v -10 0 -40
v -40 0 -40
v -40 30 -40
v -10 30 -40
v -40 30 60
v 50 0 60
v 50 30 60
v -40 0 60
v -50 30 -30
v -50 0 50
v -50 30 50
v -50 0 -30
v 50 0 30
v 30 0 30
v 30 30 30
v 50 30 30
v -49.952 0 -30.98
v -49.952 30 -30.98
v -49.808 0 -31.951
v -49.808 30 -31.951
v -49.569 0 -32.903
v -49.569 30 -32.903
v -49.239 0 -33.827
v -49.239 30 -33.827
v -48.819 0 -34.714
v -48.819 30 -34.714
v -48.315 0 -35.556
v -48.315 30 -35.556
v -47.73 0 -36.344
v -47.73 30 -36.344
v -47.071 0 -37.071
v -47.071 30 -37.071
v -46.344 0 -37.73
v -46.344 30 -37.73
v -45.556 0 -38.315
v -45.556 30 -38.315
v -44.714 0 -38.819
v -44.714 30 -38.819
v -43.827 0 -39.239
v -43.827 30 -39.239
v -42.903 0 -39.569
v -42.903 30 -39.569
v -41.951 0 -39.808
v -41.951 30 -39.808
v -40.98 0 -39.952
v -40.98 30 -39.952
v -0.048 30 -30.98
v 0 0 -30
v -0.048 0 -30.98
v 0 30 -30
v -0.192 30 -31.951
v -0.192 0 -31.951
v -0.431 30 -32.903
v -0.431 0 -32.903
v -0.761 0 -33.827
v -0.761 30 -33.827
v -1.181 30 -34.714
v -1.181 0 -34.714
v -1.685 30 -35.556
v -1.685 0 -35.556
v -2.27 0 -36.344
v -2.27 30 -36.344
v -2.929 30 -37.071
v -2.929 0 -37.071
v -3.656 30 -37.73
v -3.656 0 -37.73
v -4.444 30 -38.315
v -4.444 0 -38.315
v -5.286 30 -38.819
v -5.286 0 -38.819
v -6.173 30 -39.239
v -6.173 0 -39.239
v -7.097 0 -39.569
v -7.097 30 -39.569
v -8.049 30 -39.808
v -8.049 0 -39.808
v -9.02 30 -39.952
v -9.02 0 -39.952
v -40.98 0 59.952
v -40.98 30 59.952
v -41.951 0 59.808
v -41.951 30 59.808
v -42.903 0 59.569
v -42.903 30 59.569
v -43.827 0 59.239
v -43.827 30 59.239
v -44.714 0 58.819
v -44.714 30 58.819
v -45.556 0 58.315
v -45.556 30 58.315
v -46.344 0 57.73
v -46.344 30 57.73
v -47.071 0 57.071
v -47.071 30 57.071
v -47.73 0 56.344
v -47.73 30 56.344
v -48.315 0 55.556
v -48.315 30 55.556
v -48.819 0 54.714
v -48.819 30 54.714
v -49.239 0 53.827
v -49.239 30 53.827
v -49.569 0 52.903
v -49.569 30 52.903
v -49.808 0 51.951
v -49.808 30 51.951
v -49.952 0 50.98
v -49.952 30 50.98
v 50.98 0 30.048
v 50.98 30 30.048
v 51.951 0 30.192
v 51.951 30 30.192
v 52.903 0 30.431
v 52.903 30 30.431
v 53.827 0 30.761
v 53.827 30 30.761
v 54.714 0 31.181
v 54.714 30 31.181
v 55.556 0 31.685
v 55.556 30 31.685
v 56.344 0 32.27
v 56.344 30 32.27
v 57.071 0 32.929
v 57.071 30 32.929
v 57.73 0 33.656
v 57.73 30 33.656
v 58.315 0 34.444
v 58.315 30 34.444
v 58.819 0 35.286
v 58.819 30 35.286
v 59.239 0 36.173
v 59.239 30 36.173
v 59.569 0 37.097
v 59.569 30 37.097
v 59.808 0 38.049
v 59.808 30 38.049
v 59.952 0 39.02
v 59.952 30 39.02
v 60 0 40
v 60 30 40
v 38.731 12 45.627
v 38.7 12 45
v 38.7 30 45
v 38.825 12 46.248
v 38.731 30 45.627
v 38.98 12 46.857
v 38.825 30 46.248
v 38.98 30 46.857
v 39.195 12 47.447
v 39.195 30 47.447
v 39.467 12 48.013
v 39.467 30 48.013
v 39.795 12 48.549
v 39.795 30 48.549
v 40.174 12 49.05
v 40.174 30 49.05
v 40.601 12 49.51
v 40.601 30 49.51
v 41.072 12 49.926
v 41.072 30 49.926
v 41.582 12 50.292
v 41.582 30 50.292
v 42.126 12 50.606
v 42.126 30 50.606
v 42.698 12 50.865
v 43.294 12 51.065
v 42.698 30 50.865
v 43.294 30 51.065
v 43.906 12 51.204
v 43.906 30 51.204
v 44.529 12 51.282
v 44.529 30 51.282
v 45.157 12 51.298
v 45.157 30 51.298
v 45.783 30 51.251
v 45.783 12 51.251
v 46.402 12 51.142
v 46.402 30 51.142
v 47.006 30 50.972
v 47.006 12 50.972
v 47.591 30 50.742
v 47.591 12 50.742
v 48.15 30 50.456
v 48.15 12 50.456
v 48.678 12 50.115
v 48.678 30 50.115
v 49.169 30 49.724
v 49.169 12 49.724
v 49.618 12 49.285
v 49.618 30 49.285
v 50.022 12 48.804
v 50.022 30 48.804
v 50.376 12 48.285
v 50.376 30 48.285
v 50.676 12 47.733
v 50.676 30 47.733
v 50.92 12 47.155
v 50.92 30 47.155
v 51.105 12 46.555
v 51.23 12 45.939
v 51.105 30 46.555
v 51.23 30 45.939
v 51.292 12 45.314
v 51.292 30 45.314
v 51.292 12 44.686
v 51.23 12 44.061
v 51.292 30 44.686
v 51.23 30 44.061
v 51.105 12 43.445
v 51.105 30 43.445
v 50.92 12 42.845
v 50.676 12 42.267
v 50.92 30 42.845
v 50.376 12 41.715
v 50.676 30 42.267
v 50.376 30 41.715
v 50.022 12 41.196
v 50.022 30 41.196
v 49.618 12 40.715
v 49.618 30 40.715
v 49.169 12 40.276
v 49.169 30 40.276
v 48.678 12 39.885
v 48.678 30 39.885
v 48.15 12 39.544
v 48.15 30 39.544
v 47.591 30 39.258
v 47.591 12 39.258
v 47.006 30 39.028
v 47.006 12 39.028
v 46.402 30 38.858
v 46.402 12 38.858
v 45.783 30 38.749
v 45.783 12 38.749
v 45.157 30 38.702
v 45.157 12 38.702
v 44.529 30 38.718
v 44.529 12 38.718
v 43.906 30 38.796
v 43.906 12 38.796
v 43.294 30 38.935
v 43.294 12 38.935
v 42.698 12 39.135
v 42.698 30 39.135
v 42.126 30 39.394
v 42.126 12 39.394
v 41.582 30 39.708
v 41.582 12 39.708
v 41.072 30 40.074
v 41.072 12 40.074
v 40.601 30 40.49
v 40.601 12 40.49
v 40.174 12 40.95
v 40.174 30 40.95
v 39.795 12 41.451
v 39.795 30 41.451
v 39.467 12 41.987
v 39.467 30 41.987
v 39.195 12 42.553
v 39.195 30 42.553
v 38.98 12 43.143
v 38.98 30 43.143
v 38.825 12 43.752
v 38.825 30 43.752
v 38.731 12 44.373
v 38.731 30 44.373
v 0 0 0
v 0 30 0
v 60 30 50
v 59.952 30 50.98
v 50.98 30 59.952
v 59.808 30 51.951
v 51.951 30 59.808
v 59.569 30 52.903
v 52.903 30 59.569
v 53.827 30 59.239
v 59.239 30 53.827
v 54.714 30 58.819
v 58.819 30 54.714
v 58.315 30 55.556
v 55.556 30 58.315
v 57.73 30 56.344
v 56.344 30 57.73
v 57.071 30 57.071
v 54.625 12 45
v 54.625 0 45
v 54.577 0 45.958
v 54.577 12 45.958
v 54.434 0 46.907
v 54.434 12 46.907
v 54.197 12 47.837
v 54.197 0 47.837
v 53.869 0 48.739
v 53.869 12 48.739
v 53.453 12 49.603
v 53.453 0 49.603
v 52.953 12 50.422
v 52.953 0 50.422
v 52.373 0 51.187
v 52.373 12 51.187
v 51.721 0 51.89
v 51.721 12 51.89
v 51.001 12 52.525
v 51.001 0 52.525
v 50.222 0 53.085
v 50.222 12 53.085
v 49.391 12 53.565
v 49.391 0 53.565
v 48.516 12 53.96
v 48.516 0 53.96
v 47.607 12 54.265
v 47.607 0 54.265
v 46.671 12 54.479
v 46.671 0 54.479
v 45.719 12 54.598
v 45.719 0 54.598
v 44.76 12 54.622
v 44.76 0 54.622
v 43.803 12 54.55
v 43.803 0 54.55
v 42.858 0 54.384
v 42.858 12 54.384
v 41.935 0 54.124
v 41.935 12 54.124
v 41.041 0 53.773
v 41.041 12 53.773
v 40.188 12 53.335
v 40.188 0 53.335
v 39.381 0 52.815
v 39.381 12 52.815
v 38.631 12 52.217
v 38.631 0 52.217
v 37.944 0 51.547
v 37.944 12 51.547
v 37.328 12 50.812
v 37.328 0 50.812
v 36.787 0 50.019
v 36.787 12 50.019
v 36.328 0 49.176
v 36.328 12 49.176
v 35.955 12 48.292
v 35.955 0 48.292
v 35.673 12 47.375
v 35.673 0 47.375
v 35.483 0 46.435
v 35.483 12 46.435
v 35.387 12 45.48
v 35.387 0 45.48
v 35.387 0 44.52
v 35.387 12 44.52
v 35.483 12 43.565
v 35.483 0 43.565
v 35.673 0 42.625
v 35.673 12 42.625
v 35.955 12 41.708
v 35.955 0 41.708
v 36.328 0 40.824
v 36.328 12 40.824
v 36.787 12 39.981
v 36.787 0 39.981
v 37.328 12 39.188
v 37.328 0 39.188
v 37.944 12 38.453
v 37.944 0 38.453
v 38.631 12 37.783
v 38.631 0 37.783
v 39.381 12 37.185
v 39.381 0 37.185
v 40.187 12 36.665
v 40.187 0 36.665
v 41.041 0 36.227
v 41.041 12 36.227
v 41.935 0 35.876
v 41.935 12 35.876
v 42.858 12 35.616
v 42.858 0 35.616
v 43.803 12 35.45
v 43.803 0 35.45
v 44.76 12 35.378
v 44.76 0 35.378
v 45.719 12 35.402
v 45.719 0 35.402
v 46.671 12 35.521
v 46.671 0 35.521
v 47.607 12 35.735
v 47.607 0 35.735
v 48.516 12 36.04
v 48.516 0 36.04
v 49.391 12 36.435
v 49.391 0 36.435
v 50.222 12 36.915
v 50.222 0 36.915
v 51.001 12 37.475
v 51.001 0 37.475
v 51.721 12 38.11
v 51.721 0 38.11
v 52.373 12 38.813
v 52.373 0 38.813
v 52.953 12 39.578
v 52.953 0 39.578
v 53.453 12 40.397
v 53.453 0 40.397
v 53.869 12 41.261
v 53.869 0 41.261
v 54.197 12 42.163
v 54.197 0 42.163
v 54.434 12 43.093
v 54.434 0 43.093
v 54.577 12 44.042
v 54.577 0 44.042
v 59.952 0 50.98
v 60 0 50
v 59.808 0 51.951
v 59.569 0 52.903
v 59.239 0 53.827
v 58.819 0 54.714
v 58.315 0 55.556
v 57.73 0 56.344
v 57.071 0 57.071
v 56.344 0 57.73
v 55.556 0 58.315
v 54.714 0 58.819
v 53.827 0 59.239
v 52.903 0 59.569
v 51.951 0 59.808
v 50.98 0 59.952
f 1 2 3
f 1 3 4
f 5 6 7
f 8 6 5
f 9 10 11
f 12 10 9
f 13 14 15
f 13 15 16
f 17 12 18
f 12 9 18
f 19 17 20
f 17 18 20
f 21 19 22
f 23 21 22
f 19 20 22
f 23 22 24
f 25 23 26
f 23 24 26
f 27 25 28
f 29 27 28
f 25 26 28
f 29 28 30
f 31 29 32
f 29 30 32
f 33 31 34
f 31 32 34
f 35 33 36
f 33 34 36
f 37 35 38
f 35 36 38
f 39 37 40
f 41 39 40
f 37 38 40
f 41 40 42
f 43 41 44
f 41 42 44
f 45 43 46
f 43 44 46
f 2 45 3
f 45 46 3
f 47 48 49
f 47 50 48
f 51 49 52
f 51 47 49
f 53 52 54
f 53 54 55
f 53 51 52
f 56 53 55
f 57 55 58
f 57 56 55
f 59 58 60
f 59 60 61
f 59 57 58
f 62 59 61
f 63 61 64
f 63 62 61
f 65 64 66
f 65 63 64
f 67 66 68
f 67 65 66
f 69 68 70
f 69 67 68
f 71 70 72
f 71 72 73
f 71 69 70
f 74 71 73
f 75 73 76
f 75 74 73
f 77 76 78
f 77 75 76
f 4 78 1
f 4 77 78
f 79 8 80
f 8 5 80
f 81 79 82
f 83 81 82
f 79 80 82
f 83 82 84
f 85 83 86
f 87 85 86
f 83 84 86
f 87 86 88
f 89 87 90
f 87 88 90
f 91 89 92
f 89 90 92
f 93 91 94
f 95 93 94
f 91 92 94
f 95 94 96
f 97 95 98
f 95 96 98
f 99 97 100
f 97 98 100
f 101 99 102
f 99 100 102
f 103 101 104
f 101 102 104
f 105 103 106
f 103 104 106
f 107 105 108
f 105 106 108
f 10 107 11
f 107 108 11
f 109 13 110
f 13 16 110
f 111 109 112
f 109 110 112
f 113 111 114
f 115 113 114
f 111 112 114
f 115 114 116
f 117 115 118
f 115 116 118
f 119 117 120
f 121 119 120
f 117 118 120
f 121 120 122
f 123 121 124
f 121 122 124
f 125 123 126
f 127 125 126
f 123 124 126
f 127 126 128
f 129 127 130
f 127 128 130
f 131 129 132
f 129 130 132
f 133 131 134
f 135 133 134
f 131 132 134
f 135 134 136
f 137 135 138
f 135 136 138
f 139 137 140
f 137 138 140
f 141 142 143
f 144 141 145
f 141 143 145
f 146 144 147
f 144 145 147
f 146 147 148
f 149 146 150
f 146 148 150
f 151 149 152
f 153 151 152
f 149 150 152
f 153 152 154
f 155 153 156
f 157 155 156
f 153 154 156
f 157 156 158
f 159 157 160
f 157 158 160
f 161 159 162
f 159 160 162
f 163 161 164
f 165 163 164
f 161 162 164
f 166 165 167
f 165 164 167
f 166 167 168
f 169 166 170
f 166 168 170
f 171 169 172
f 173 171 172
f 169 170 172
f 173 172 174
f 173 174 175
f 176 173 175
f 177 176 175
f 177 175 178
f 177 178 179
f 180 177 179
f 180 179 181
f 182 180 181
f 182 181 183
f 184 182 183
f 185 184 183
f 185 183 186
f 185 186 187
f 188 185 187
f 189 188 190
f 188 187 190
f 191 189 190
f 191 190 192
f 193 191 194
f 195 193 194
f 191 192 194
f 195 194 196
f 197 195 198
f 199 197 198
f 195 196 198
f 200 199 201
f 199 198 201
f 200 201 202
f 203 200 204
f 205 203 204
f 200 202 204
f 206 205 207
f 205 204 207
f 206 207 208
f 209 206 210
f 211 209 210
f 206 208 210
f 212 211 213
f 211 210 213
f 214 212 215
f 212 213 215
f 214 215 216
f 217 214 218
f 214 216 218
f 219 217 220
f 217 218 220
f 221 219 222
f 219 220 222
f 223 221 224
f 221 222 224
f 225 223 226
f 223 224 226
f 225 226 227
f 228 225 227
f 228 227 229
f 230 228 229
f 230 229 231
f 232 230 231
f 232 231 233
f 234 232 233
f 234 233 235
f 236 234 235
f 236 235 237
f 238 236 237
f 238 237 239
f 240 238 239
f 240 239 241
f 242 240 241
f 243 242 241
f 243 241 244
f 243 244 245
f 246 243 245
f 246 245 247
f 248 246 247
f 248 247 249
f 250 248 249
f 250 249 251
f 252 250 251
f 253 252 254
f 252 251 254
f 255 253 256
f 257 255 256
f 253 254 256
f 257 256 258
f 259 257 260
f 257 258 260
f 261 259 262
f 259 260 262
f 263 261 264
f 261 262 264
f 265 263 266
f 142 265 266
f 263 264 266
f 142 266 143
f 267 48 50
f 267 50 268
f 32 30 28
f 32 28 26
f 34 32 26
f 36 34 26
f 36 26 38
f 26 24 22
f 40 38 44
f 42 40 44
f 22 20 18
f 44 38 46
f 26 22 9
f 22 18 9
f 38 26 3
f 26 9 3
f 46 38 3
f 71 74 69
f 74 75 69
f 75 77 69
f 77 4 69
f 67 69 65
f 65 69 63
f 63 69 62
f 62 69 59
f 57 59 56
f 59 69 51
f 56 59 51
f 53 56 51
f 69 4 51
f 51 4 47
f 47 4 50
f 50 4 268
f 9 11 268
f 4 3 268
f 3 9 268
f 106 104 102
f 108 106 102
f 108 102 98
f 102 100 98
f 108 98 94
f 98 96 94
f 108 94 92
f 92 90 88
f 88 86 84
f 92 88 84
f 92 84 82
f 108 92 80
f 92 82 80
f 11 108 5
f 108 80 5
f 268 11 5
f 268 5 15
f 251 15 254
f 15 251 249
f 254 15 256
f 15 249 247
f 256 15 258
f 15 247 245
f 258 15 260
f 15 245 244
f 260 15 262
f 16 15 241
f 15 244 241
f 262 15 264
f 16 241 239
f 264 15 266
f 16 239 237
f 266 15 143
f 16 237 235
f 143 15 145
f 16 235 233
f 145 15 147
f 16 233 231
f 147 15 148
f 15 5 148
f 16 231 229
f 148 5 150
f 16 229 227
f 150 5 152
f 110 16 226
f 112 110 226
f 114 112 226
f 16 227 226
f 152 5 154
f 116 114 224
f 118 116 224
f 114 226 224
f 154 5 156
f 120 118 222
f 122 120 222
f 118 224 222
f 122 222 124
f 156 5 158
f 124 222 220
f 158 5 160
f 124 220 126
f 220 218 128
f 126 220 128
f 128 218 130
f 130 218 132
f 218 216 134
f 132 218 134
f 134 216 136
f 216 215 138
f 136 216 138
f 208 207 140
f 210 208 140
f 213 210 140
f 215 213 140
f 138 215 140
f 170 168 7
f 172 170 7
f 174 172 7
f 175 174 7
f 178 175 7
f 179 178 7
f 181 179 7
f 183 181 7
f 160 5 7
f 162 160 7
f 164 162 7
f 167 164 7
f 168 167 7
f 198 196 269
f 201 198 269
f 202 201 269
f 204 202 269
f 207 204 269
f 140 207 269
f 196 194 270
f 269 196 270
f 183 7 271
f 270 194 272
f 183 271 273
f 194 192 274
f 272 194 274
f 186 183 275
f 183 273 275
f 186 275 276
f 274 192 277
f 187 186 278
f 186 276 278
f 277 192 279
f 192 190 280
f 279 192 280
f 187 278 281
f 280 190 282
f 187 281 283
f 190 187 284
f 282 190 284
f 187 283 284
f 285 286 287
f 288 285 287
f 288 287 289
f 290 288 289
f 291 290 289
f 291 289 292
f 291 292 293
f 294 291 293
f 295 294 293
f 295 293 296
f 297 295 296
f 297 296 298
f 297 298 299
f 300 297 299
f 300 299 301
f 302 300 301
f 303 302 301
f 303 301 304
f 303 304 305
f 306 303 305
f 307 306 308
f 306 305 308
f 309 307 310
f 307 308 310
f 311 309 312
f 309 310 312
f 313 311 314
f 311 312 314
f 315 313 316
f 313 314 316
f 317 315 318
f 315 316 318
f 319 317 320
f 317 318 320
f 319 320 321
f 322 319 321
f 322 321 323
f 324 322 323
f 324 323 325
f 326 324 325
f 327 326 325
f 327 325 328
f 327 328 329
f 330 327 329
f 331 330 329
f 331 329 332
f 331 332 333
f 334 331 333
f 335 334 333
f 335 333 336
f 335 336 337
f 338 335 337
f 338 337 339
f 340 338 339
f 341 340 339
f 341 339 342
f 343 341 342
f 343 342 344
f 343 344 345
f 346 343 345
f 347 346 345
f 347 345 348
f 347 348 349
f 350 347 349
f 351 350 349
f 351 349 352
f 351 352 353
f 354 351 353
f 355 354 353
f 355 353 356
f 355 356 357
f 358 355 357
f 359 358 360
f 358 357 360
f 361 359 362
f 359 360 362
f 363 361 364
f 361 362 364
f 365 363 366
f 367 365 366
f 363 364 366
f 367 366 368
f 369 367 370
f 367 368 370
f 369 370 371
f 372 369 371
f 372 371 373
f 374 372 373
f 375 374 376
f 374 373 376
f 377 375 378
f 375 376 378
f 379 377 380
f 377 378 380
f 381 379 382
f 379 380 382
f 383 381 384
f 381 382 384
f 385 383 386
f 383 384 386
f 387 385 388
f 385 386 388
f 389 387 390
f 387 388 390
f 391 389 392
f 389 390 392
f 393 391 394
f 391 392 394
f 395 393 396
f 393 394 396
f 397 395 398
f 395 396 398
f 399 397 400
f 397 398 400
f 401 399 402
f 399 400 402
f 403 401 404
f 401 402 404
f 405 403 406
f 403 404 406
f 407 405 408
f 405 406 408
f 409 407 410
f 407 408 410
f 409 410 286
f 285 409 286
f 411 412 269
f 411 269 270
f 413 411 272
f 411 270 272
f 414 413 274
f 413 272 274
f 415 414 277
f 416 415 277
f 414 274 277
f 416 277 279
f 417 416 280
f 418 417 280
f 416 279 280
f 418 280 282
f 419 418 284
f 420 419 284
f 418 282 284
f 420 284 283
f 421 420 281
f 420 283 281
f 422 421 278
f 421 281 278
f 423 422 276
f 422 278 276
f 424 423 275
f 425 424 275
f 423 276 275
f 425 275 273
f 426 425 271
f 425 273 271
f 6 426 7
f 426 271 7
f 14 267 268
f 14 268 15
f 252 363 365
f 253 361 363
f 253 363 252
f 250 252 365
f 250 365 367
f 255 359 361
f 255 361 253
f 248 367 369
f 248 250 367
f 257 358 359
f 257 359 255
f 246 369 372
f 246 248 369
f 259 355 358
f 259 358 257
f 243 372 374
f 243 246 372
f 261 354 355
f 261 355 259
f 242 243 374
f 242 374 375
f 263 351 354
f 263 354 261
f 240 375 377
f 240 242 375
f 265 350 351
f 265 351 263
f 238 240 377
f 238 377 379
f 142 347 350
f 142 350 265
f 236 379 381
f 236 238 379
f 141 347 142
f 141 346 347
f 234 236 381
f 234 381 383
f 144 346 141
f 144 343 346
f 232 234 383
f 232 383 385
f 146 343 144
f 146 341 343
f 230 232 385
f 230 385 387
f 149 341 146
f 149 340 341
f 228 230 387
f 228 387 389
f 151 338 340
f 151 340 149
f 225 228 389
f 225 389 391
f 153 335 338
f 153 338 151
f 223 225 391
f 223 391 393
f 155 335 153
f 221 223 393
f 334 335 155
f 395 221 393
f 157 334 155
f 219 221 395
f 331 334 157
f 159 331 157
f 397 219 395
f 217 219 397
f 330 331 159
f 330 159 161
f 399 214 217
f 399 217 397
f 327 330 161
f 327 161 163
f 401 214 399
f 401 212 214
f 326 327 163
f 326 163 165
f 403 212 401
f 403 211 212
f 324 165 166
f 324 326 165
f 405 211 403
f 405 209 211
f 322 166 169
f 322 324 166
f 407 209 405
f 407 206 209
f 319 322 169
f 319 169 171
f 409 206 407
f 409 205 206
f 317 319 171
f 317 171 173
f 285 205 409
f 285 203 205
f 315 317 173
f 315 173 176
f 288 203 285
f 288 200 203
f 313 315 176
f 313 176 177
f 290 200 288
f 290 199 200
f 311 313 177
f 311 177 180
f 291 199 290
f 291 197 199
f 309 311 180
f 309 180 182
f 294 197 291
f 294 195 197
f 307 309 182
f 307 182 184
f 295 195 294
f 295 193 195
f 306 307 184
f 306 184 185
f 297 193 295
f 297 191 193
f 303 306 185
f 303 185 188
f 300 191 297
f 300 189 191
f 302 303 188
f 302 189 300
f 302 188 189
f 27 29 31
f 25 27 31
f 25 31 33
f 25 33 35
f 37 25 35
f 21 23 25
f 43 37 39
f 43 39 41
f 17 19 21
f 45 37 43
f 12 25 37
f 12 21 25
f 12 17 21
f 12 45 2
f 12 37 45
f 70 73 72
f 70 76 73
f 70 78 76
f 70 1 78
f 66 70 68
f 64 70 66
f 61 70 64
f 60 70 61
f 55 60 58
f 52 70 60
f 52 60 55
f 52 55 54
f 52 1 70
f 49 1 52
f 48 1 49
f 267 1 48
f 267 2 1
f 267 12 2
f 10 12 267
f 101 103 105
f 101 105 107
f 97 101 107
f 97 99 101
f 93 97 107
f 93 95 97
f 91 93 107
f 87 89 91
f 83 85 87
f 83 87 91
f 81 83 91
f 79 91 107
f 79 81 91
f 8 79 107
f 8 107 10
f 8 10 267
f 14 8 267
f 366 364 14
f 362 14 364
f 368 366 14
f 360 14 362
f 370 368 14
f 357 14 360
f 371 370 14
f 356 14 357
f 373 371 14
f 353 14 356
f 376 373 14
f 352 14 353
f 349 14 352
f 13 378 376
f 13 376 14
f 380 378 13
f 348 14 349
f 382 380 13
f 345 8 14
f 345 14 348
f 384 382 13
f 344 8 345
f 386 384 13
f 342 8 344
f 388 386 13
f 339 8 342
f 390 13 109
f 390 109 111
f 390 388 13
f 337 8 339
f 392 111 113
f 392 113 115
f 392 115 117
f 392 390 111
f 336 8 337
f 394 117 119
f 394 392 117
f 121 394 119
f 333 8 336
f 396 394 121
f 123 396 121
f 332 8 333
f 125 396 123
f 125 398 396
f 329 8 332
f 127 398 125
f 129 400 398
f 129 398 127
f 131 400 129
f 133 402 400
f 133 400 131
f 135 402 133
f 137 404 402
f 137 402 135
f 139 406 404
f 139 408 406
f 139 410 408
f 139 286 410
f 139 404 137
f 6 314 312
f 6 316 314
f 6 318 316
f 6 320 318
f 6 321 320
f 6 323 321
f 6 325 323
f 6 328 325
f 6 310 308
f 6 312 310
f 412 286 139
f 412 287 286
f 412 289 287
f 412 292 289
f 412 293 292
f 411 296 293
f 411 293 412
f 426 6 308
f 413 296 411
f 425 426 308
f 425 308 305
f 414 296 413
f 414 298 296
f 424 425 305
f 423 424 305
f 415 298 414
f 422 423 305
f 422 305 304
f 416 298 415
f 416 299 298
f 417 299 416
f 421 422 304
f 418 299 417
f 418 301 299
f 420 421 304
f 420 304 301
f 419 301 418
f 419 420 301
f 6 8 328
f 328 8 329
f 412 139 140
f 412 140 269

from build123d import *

# Parameters (mm, degrees)
F1_DEPTH       = 30
F2_R           = 10
F3_D           = 12.6
F3_CBORE_D     = 19.25
F3_CBORE_DEPTH = 12


with BuildPart() as f1:
    # F0 (on Front) → F1 (new body)
    with BuildSketch(Plane.XZ):
        Polygon((0, -40), (0, 0), (30, 30), (60, 30), (60, 60), (-50, 60), (-50, -40), align=None)
    extrude(amount=-F1_DEPTH)

    # F2
    f2_edges = [f1.edges().sort_by_distance(p)[0] for p in [
        (-50, 15, -40),
        (0, 15, -40),
        (-50, 15, 60),
        (60, 15, 60),
        (60, 15, 30),
    ]]
    fillet(f2_edges, radius=F2_R)

    # F3 (through all)
    with Locations(Plane.XZ):
        with Locations((45, 45)):
            CounterBoreHole(F3_D / 2, F3_CBORE_D / 2, F3_CBORE_DEPTH)


solid = f1.part
